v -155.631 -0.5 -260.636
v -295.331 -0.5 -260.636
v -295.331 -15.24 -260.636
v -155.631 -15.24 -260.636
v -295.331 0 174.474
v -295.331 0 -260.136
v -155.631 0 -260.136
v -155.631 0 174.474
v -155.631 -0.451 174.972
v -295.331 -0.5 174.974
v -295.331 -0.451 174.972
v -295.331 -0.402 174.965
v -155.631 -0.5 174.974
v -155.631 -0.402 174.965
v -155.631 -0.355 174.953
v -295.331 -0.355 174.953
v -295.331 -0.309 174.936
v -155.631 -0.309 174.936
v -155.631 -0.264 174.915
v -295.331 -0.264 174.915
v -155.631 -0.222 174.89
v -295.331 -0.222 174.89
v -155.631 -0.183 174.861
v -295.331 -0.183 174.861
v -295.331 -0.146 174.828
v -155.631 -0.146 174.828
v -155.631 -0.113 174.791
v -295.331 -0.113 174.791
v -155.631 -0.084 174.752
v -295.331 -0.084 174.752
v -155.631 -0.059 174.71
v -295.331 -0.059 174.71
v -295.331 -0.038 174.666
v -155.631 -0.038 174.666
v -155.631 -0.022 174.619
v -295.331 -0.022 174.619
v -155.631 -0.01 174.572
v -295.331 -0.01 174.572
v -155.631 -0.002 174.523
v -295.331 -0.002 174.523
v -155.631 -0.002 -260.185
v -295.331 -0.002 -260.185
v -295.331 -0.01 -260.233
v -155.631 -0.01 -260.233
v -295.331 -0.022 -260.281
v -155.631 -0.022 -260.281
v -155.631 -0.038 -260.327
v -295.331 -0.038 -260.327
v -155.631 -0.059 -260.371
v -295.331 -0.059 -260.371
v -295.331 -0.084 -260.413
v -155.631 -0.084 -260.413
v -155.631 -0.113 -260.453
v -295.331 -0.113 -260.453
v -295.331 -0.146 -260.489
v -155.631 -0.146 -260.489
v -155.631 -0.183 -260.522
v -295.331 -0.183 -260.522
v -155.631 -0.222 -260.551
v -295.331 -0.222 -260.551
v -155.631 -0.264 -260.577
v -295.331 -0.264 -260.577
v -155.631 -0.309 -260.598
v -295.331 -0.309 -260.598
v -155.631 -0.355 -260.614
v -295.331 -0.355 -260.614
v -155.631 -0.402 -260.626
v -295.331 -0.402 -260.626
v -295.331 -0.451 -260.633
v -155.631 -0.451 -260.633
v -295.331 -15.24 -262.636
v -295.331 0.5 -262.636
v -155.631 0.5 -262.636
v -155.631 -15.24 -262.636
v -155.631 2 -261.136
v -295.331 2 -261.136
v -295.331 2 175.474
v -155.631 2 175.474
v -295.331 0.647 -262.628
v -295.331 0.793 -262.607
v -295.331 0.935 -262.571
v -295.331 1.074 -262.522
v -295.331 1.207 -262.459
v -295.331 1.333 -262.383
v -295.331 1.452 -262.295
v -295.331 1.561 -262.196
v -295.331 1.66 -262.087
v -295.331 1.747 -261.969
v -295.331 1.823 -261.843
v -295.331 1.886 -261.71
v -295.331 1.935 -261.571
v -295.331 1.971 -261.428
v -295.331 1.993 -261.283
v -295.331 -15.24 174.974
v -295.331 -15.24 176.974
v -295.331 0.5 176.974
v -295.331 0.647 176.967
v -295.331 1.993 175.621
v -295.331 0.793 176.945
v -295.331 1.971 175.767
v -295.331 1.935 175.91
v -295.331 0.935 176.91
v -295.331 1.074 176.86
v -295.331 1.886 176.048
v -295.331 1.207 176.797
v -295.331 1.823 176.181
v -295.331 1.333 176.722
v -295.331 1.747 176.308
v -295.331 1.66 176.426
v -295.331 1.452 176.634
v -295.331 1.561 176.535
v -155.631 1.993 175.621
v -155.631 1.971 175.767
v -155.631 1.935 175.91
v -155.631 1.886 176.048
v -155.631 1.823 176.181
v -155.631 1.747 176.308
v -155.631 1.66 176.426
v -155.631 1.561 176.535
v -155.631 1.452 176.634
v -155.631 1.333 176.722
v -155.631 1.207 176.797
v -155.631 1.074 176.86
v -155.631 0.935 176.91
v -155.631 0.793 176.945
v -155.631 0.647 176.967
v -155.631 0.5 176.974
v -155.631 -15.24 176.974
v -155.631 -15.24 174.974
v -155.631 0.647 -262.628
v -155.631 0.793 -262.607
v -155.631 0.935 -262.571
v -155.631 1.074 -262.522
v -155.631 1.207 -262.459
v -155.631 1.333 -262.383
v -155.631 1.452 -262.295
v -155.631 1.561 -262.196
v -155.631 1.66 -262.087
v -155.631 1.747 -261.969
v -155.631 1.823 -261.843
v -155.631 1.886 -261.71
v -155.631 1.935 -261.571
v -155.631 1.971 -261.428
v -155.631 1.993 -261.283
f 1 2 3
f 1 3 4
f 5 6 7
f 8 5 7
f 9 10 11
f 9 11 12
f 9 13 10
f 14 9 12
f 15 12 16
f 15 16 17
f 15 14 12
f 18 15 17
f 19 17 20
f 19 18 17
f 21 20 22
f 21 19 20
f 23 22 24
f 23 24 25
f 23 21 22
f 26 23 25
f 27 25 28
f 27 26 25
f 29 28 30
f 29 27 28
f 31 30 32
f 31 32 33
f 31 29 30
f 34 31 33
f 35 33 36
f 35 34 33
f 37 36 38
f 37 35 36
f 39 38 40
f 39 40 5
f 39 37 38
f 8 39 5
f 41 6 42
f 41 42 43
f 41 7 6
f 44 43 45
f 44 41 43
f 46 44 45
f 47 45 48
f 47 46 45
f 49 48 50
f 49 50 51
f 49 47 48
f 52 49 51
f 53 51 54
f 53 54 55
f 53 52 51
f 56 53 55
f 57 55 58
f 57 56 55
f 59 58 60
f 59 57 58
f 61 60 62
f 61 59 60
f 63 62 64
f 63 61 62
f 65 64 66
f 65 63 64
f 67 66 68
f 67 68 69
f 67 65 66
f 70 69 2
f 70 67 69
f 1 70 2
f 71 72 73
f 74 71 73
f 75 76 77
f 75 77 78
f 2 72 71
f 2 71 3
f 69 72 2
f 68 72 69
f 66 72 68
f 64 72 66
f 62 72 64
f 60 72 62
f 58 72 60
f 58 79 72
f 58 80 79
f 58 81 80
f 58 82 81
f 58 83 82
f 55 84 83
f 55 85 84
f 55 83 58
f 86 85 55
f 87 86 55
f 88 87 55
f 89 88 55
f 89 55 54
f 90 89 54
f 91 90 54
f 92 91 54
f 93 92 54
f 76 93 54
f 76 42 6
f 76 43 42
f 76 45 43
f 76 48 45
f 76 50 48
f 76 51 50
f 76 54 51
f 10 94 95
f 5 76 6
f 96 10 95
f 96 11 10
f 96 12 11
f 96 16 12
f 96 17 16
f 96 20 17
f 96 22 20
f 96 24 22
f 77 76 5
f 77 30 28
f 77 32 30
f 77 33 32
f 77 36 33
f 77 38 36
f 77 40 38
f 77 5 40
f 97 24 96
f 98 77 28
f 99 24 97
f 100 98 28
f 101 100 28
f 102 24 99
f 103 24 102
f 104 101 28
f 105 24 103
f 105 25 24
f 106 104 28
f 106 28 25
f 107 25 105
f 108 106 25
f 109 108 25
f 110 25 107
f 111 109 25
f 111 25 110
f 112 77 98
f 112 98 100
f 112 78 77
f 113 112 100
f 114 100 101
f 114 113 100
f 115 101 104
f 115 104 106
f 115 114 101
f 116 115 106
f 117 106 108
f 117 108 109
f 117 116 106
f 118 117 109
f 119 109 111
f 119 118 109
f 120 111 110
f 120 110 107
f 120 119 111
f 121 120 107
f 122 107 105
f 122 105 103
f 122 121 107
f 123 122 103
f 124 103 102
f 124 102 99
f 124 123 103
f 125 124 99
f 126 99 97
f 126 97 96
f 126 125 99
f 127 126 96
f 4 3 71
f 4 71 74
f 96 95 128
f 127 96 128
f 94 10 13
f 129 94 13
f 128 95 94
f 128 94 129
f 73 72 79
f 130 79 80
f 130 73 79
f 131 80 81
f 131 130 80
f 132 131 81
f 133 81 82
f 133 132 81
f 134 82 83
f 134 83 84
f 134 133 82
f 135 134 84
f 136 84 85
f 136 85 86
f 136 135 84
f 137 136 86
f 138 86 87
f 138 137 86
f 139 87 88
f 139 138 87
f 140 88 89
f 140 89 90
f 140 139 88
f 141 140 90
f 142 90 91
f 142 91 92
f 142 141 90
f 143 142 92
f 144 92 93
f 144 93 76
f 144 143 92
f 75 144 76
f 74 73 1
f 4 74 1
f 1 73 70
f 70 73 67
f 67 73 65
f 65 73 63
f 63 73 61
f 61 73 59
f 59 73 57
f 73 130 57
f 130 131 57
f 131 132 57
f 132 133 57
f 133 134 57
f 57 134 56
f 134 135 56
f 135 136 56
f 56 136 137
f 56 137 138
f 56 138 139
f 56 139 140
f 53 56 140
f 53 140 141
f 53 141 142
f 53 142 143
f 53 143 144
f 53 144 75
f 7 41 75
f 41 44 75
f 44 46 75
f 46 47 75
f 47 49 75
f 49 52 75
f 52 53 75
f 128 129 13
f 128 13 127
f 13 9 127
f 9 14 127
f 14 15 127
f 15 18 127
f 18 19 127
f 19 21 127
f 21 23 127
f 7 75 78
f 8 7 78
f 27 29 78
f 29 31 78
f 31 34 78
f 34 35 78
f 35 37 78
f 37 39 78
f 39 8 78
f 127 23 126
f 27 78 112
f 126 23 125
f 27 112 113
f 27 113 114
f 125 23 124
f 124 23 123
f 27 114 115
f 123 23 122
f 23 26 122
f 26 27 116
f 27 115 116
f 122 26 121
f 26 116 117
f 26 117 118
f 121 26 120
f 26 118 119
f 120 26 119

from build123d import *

# Parameters (mm, degrees)
SKETCH1_W           = 139.7
SKETCH1_H           = 439.61
BOSS_EXTRUDE1_DEPTH = 2
SKETCH2_W           = 139.7
SKETCH2_H           = 2
BOSS_EXTRUDE2_DEPTH = 15.24
FILLET1_R           = 1.5
FILLET2_R           = 0.5


with BuildPart() as part:
    # Sketch1 → Boss-Extrude1 (new body)
    with BuildSketch(Plane(origin=(0, 0, 0), x_dir=(1, 0, 0), z_dir=(0, 1, 0))):
        with Locations((-225.481193932, 42.830702244)):
            Rectangle(SKETCH1_W, SKETCH1_H)
    extrude(amount=BOSS_EXTRUDE1_DEPTH)

    # Sketch2 → Boss-Extrude2 (add)
    with BuildSketch(Plane.XZ):
        with Locations((-225.481193932, -261.635702244)):
            Rectangle(SKETCH2_W, SKETCH2_H)
        with Locations((-225.481193932, 175.974297756)):
            Rectangle(SKETCH2_W, SKETCH2_H)
    extrude(amount=BOSS_EXTRUDE2_DEPTH)

    # Fillet1
    fillet1_edges = [part.edges().sort_by_distance(p)[0] for p in [
        (-225.481193932, 2, 176.974297756),
        (-225.481193932, 2, -262.635702244),
    ]]
    fillet(fillet1_edges, radius=FILLET1_R)

    # Fillet2
    fillet2_edges = [part.edges().sort_by_distance(p)[0] for p in [
        (-225.481193932, 0, -260.635702244),
        (-225.481193932, 0, 174.974297756),
    ]]
    fillet(fillet2_edges, radius=FILLET2_R)


solid = part.part
